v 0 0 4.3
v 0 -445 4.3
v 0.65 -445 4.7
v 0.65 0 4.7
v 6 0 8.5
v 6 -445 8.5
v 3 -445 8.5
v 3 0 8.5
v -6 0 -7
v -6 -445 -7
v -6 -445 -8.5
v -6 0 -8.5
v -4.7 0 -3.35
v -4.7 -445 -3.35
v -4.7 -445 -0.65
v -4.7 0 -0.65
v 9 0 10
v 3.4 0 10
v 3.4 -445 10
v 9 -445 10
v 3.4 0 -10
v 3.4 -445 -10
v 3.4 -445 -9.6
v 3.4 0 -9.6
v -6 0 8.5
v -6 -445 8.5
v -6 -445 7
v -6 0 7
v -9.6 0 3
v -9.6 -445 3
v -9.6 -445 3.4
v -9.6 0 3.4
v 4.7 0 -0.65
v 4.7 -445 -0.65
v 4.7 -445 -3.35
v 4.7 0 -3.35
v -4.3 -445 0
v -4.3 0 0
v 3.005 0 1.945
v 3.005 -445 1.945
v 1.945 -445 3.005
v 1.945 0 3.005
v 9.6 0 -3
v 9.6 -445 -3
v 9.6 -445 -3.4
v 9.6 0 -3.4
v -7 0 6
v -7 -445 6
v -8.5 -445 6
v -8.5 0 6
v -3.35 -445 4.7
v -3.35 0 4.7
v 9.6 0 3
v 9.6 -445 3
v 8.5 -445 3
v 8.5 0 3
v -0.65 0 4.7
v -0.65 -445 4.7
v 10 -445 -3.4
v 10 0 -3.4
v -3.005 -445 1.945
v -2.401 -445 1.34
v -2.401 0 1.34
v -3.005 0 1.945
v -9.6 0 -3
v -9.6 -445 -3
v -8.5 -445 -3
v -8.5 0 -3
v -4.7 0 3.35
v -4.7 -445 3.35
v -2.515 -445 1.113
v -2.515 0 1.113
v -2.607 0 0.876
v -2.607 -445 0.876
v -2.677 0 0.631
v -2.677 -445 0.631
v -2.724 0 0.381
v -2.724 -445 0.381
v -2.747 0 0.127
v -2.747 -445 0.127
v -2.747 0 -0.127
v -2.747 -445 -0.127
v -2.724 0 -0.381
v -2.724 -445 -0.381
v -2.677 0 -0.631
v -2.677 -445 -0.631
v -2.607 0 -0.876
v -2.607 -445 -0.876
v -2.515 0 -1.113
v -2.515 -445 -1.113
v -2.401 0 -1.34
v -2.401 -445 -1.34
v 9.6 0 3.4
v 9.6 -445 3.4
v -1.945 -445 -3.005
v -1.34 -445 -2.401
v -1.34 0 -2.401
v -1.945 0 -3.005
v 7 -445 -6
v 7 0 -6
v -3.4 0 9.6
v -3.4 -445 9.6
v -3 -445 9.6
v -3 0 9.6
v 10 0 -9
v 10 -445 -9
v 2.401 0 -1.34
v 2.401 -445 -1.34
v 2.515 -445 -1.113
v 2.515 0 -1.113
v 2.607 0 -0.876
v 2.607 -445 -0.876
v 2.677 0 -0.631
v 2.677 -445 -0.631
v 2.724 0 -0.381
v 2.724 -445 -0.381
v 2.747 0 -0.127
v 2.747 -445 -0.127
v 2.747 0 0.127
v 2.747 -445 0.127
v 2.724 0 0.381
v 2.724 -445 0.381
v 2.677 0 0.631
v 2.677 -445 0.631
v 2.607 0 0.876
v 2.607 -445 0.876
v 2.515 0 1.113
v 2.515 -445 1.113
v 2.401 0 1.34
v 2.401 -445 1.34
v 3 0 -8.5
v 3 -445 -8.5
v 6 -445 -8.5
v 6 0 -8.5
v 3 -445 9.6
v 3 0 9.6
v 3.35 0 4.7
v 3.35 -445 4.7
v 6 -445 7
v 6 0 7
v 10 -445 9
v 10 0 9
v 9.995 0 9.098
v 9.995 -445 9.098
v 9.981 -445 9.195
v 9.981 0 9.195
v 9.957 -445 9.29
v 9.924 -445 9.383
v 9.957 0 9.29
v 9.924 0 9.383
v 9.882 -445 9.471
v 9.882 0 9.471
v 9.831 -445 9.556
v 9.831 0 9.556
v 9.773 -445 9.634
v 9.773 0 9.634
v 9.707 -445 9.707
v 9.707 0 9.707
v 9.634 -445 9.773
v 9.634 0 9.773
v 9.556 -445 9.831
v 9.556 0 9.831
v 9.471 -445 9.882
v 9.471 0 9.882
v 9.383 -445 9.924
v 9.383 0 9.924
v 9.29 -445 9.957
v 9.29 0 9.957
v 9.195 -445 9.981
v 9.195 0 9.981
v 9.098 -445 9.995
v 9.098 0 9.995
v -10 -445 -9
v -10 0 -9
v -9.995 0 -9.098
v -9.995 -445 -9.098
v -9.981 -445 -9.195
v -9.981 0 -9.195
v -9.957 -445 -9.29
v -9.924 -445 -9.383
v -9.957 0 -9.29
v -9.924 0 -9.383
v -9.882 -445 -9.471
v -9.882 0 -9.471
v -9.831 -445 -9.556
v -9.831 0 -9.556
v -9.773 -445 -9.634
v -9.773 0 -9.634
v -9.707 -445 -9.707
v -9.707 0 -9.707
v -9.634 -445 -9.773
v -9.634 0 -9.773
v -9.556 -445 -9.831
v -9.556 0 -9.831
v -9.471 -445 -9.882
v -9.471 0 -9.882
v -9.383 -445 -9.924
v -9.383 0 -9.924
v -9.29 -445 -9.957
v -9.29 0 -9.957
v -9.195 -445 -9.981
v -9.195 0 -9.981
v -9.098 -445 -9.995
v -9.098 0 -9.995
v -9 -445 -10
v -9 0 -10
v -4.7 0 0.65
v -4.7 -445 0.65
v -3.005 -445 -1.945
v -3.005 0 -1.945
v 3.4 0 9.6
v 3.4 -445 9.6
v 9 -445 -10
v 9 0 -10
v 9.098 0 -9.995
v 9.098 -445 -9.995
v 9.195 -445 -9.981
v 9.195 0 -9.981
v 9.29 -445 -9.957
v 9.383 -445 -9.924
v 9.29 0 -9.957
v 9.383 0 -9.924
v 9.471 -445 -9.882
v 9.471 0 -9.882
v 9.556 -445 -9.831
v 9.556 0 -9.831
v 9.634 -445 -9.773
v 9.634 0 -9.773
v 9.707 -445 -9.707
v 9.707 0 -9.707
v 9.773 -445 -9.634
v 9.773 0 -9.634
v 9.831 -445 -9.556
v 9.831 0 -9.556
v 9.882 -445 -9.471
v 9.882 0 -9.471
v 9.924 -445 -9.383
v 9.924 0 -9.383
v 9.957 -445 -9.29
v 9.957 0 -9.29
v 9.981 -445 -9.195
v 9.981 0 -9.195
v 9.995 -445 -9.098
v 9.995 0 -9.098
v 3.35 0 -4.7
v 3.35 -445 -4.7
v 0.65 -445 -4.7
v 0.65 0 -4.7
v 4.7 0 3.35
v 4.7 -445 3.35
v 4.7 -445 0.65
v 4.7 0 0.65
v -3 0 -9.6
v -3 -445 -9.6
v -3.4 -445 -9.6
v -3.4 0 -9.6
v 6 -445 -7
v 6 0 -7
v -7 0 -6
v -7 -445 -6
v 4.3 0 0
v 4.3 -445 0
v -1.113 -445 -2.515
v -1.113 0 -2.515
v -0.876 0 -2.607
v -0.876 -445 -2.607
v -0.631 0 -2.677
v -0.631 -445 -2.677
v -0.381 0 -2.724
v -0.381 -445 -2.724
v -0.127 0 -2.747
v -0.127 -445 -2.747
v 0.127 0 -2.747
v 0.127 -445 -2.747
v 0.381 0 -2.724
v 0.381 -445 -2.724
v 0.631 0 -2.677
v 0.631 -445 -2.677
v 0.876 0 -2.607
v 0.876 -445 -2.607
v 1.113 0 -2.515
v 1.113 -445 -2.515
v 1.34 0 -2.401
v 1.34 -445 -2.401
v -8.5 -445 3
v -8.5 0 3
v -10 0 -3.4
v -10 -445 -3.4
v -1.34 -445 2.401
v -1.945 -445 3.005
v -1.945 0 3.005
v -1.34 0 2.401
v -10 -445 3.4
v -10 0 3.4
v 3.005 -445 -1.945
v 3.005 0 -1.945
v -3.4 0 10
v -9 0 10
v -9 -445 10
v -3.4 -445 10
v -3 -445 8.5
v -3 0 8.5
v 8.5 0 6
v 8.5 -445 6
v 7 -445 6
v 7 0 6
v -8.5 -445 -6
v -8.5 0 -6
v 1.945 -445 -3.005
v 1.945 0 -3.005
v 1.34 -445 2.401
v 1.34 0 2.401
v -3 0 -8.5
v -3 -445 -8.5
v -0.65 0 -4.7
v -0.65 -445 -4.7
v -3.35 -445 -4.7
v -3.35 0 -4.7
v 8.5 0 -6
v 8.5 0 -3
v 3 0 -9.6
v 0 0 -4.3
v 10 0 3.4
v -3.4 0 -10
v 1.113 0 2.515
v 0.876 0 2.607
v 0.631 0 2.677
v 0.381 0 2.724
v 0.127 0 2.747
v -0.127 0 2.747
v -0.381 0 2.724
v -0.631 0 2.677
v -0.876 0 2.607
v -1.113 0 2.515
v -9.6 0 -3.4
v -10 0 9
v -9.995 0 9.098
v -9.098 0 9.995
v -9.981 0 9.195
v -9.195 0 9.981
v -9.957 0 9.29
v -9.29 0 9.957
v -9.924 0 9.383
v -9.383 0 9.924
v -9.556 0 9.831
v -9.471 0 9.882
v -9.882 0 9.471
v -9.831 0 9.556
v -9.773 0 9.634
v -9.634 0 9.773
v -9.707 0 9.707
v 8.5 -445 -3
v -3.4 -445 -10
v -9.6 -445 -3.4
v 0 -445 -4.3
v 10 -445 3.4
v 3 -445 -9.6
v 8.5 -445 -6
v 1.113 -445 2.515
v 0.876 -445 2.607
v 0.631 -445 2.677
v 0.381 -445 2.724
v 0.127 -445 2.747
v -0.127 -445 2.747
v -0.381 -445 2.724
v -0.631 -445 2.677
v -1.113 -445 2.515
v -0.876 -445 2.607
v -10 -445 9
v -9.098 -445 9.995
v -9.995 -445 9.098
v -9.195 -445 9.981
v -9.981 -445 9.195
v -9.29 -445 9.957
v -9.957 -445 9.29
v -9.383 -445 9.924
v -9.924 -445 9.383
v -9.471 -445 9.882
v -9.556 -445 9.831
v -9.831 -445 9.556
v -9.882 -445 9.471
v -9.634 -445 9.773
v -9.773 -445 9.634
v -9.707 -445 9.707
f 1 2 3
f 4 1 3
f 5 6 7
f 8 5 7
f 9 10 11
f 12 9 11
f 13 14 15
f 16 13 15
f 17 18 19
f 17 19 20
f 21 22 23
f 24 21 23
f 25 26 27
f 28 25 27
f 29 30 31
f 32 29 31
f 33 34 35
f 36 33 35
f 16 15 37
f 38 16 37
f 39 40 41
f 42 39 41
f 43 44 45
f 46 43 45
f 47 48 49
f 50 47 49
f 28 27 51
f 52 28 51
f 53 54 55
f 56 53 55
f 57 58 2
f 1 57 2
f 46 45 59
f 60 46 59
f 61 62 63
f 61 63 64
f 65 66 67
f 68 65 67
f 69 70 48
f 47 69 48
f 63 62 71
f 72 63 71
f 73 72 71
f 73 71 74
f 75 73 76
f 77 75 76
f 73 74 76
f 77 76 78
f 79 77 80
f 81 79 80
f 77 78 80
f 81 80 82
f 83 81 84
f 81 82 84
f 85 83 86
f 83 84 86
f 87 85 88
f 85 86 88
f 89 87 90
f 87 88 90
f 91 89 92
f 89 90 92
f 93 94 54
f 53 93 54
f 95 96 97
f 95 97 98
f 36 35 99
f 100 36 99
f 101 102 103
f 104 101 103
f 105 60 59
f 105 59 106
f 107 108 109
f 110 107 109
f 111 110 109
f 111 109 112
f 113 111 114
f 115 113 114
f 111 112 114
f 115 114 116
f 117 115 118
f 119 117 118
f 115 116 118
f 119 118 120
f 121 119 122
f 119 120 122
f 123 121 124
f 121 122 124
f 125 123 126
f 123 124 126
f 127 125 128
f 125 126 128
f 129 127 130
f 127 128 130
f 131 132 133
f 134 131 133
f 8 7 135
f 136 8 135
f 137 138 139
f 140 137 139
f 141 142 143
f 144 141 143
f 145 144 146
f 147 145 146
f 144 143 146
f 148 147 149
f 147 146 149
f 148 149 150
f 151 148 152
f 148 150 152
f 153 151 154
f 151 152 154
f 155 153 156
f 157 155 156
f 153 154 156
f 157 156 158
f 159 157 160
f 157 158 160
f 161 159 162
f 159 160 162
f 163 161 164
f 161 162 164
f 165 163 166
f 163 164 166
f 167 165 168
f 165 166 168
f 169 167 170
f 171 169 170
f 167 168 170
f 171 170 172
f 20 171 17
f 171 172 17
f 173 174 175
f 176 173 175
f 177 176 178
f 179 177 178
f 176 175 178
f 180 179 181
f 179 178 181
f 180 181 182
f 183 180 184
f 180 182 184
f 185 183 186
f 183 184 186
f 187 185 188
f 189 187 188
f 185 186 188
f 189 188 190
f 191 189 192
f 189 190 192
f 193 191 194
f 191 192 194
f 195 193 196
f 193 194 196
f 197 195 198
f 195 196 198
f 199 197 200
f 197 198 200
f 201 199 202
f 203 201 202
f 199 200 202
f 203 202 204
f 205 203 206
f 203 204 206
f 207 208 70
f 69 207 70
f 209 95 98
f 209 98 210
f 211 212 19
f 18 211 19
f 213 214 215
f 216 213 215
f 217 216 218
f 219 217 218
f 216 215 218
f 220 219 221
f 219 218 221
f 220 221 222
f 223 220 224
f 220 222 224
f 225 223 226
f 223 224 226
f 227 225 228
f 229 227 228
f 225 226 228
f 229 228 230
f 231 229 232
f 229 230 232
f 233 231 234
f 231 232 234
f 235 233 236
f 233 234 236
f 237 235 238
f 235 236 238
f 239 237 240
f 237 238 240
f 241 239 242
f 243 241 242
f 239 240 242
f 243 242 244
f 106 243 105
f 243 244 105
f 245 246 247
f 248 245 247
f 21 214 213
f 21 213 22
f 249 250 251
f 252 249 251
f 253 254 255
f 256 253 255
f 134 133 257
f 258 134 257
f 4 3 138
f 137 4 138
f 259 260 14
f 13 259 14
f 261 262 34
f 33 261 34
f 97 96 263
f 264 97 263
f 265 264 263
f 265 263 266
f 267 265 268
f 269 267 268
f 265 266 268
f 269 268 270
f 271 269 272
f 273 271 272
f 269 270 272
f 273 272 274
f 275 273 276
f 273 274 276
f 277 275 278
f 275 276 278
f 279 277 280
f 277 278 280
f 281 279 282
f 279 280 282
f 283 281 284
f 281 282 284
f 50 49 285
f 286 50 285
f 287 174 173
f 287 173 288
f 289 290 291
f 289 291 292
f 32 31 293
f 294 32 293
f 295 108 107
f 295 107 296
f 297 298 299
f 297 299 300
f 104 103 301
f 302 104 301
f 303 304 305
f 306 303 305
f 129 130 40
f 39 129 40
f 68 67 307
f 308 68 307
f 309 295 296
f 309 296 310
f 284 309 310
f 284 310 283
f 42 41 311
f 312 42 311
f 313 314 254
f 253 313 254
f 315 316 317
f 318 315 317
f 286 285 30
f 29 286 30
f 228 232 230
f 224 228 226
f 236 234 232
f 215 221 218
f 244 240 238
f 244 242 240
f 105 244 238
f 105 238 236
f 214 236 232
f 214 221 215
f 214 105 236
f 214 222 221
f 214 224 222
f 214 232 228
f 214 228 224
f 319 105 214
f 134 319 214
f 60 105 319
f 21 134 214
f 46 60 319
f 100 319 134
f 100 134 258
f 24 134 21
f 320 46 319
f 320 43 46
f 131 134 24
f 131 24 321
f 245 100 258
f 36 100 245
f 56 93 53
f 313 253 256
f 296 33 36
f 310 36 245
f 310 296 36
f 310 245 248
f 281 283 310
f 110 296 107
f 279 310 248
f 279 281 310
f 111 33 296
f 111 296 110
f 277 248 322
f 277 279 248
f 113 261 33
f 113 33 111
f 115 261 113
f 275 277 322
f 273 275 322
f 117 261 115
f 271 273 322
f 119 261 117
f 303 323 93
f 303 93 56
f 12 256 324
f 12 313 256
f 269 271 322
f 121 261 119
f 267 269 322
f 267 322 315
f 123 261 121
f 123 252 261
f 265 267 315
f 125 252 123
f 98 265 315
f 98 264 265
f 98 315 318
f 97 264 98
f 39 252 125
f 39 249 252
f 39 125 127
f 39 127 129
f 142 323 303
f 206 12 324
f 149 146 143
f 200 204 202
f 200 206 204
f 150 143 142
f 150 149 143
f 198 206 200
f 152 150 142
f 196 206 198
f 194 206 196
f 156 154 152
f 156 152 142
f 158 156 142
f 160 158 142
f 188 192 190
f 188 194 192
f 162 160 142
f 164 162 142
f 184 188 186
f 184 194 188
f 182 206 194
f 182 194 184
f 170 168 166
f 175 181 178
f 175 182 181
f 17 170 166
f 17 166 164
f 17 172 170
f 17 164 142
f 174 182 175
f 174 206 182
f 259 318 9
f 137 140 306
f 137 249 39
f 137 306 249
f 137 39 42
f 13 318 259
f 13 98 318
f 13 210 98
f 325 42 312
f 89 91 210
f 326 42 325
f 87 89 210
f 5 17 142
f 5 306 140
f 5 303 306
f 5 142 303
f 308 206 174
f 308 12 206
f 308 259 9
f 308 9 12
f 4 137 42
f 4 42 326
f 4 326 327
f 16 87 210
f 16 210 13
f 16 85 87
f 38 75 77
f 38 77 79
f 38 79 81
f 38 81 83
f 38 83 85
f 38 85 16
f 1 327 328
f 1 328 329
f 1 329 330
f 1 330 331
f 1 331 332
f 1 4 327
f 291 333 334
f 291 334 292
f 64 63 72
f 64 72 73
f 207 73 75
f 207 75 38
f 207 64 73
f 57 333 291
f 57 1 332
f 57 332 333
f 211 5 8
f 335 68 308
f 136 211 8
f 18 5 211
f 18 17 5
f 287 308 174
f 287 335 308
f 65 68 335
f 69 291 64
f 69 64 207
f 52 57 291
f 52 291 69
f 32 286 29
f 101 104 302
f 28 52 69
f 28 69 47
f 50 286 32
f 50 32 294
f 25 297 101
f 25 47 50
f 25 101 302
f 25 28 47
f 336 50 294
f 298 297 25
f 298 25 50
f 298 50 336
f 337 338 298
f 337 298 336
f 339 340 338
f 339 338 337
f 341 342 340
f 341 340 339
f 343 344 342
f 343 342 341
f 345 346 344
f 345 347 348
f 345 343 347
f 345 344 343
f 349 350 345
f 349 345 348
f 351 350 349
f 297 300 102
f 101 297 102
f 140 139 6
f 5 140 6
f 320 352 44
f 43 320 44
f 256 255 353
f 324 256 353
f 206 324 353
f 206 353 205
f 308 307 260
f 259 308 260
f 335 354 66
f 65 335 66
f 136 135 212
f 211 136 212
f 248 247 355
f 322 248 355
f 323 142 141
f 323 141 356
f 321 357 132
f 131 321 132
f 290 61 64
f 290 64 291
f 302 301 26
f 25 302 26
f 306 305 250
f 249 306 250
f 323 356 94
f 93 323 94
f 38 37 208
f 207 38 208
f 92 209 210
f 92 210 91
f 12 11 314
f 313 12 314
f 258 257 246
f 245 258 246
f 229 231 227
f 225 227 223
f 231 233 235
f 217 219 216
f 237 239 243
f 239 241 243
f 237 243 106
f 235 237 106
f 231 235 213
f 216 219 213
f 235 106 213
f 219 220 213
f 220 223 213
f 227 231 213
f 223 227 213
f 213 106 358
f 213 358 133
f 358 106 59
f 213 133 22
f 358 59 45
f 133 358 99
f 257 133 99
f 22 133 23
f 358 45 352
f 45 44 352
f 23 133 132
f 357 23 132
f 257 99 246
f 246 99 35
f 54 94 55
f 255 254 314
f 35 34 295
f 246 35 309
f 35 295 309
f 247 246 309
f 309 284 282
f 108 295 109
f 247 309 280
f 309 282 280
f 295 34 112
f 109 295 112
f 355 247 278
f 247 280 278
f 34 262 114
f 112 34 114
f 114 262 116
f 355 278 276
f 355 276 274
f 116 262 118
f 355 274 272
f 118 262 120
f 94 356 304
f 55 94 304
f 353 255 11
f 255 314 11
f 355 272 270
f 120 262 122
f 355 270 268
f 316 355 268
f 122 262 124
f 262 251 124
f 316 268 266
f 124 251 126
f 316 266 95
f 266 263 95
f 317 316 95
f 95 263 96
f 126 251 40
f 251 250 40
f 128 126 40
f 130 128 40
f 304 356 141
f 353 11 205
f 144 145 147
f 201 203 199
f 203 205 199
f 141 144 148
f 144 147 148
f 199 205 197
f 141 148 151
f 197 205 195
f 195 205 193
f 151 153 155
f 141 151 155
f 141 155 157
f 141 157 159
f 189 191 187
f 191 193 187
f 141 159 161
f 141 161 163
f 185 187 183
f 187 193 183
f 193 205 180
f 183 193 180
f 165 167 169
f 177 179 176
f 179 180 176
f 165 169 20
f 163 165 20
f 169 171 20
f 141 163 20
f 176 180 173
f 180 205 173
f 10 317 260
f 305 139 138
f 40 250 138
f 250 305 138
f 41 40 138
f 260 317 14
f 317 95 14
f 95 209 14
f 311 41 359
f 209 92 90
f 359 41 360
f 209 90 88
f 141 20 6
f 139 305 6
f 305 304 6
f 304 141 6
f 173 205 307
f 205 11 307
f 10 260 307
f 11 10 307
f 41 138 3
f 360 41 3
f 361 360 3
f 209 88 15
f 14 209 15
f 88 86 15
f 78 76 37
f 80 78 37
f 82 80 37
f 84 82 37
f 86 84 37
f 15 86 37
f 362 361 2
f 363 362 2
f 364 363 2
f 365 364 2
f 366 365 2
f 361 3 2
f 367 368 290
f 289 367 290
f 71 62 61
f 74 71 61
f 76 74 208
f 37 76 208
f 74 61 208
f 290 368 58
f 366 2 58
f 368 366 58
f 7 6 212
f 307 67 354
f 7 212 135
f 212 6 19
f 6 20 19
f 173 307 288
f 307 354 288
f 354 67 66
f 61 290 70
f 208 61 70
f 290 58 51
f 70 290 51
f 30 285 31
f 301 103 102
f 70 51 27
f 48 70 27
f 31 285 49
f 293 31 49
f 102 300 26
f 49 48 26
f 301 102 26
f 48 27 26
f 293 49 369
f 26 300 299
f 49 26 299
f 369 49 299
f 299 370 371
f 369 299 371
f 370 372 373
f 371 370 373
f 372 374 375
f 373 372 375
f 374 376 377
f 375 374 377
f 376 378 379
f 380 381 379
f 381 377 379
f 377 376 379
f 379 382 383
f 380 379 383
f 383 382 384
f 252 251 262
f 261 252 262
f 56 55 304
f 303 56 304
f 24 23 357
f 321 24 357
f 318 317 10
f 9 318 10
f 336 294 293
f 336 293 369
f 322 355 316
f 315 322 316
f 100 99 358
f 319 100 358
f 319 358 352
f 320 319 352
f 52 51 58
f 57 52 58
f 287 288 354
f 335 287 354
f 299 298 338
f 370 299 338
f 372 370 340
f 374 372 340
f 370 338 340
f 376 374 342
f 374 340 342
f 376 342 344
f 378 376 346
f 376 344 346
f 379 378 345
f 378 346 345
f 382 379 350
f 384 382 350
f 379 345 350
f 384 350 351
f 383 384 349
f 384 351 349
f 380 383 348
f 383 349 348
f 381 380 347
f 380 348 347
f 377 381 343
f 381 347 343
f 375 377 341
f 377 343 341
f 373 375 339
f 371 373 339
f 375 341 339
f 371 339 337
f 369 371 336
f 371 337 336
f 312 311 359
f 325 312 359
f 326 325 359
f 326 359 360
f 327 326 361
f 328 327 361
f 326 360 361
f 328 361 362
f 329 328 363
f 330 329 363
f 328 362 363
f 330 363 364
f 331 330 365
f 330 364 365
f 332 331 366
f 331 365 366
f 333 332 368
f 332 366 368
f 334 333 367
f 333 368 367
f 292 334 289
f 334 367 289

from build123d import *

# Parameters (mm, degrees)
PAD001003_DEPTH       = 445
POCKET020_DEPTH       = 445
POLARPATTERN001_COUNT = 4
POCKET021_DEPTH       = 445


with BuildPart() as part:
    # Sketch025 → Pad001003 (new body)
    with BuildSketch(Plane.XZ):
        with BuildLine():
            Line((-9, 10), (9, 10))
            ThreePointArc((10, 9), (9.707107, 9.707107), (9, 10))
            Line((10, 9), (10, -9))
            ThreePointArc((9, -10), (9.707107, -9.707107), (10, -9))
            Line((9, -10), (-9, -10))
            ThreePointArc((-10, -9), (-9.707107, -9.707107), (-9, -10))
            Line((-10, -9), (-10, 9))
            ThreePointArc((-9, 10), (-9.707107, 9.707107), (-10, 9))
        make_face()
    extrude(amount=PAD001003_DEPTH)

    # Sketch027 (on Face10 of Pad001003) → Pocket020 (cut)
    with BuildSketch(Plane.XZ.offset(445)):
        Polygon((-3.4, 10), (-3.4, 9.6), (-3, 9.6), (-3, 8.5), (-6, 8.5), (-6, 7), (-3.35, 4.7), (-0.65, 4.7), (0, 4.3), (0.65, 4.7), (3.35, 4.7), (6, 7), (6, 8.5), (3, 8.5), (3, 9.6), (3.4, 9.6), (3.4, 10), align=None)
    pocket020 = extrude(amount=-POCKET020_DEPTH, mode=Mode.SUBTRACT)

    # PolarPattern001: Pocket020 ×4 about axis
    polarpattern001_axis = Axis((0, -445, 0), (0, -1, 0))
    for i in range(1, POLARPATTERN001_COUNT):
        add(pocket020.rotate(polarpattern001_axis, i * 360 / POLARPATTERN001_COUNT), mode=Mode.SUBTRACT)

    # Sketch026 (on Face4 of PolarPattern001) → Pocket021 (cut)
    with BuildSketch(Plane.XZ.offset(445)):
        with BuildLine():
            ThreePointArc((1.340499, 2.401159), (0, 2.75), (-1.340499, 2.401159))
            Line((-1.944544, 3.005204), (-1.340499, 2.401159))
            Line((-3.005204, 1.944544), (-1.944544, 3.005204))
            Line((-2.401159, 1.340499), (-3.005204, 1.944544))
            ThreePointArc((-2.401159, 1.340499), (-2.75, 0), (-2.401159, -1.340499))
            Line((-3.005204, -1.944544), (-2.401159, -1.340499))
            Line((-1.944544, -3.005204), (-3.005204, -1.944544))
            Line((-1.340499, -2.401159), (-1.944544, -3.005204))
            ThreePointArc((-1.340499, -2.401159), (0, -2.75), (1.340499, -2.401159))
            Line((1.944544, -3.005204), (1.340499, -2.401159))
            Line((3.005204, -1.944544), (1.944544, -3.005204))
            Line((2.401159, -1.340499), (3.005204, -1.944544))
            ThreePointArc((2.401159, -1.340499), (2.75, 0), (2.401159, 1.340499))
            Line((2.401159, 1.340499), (3.005204, 1.944544))
            Line((3.005204, 1.944544), (1.944544, 3.005204))
            Line((1.944544, 3.005204), (1.340499, 2.401159))
        make_face()
    extrude(amount=-POCKET021_DEPTH, mode=Mode.SUBTRACT)


solid = part.part
